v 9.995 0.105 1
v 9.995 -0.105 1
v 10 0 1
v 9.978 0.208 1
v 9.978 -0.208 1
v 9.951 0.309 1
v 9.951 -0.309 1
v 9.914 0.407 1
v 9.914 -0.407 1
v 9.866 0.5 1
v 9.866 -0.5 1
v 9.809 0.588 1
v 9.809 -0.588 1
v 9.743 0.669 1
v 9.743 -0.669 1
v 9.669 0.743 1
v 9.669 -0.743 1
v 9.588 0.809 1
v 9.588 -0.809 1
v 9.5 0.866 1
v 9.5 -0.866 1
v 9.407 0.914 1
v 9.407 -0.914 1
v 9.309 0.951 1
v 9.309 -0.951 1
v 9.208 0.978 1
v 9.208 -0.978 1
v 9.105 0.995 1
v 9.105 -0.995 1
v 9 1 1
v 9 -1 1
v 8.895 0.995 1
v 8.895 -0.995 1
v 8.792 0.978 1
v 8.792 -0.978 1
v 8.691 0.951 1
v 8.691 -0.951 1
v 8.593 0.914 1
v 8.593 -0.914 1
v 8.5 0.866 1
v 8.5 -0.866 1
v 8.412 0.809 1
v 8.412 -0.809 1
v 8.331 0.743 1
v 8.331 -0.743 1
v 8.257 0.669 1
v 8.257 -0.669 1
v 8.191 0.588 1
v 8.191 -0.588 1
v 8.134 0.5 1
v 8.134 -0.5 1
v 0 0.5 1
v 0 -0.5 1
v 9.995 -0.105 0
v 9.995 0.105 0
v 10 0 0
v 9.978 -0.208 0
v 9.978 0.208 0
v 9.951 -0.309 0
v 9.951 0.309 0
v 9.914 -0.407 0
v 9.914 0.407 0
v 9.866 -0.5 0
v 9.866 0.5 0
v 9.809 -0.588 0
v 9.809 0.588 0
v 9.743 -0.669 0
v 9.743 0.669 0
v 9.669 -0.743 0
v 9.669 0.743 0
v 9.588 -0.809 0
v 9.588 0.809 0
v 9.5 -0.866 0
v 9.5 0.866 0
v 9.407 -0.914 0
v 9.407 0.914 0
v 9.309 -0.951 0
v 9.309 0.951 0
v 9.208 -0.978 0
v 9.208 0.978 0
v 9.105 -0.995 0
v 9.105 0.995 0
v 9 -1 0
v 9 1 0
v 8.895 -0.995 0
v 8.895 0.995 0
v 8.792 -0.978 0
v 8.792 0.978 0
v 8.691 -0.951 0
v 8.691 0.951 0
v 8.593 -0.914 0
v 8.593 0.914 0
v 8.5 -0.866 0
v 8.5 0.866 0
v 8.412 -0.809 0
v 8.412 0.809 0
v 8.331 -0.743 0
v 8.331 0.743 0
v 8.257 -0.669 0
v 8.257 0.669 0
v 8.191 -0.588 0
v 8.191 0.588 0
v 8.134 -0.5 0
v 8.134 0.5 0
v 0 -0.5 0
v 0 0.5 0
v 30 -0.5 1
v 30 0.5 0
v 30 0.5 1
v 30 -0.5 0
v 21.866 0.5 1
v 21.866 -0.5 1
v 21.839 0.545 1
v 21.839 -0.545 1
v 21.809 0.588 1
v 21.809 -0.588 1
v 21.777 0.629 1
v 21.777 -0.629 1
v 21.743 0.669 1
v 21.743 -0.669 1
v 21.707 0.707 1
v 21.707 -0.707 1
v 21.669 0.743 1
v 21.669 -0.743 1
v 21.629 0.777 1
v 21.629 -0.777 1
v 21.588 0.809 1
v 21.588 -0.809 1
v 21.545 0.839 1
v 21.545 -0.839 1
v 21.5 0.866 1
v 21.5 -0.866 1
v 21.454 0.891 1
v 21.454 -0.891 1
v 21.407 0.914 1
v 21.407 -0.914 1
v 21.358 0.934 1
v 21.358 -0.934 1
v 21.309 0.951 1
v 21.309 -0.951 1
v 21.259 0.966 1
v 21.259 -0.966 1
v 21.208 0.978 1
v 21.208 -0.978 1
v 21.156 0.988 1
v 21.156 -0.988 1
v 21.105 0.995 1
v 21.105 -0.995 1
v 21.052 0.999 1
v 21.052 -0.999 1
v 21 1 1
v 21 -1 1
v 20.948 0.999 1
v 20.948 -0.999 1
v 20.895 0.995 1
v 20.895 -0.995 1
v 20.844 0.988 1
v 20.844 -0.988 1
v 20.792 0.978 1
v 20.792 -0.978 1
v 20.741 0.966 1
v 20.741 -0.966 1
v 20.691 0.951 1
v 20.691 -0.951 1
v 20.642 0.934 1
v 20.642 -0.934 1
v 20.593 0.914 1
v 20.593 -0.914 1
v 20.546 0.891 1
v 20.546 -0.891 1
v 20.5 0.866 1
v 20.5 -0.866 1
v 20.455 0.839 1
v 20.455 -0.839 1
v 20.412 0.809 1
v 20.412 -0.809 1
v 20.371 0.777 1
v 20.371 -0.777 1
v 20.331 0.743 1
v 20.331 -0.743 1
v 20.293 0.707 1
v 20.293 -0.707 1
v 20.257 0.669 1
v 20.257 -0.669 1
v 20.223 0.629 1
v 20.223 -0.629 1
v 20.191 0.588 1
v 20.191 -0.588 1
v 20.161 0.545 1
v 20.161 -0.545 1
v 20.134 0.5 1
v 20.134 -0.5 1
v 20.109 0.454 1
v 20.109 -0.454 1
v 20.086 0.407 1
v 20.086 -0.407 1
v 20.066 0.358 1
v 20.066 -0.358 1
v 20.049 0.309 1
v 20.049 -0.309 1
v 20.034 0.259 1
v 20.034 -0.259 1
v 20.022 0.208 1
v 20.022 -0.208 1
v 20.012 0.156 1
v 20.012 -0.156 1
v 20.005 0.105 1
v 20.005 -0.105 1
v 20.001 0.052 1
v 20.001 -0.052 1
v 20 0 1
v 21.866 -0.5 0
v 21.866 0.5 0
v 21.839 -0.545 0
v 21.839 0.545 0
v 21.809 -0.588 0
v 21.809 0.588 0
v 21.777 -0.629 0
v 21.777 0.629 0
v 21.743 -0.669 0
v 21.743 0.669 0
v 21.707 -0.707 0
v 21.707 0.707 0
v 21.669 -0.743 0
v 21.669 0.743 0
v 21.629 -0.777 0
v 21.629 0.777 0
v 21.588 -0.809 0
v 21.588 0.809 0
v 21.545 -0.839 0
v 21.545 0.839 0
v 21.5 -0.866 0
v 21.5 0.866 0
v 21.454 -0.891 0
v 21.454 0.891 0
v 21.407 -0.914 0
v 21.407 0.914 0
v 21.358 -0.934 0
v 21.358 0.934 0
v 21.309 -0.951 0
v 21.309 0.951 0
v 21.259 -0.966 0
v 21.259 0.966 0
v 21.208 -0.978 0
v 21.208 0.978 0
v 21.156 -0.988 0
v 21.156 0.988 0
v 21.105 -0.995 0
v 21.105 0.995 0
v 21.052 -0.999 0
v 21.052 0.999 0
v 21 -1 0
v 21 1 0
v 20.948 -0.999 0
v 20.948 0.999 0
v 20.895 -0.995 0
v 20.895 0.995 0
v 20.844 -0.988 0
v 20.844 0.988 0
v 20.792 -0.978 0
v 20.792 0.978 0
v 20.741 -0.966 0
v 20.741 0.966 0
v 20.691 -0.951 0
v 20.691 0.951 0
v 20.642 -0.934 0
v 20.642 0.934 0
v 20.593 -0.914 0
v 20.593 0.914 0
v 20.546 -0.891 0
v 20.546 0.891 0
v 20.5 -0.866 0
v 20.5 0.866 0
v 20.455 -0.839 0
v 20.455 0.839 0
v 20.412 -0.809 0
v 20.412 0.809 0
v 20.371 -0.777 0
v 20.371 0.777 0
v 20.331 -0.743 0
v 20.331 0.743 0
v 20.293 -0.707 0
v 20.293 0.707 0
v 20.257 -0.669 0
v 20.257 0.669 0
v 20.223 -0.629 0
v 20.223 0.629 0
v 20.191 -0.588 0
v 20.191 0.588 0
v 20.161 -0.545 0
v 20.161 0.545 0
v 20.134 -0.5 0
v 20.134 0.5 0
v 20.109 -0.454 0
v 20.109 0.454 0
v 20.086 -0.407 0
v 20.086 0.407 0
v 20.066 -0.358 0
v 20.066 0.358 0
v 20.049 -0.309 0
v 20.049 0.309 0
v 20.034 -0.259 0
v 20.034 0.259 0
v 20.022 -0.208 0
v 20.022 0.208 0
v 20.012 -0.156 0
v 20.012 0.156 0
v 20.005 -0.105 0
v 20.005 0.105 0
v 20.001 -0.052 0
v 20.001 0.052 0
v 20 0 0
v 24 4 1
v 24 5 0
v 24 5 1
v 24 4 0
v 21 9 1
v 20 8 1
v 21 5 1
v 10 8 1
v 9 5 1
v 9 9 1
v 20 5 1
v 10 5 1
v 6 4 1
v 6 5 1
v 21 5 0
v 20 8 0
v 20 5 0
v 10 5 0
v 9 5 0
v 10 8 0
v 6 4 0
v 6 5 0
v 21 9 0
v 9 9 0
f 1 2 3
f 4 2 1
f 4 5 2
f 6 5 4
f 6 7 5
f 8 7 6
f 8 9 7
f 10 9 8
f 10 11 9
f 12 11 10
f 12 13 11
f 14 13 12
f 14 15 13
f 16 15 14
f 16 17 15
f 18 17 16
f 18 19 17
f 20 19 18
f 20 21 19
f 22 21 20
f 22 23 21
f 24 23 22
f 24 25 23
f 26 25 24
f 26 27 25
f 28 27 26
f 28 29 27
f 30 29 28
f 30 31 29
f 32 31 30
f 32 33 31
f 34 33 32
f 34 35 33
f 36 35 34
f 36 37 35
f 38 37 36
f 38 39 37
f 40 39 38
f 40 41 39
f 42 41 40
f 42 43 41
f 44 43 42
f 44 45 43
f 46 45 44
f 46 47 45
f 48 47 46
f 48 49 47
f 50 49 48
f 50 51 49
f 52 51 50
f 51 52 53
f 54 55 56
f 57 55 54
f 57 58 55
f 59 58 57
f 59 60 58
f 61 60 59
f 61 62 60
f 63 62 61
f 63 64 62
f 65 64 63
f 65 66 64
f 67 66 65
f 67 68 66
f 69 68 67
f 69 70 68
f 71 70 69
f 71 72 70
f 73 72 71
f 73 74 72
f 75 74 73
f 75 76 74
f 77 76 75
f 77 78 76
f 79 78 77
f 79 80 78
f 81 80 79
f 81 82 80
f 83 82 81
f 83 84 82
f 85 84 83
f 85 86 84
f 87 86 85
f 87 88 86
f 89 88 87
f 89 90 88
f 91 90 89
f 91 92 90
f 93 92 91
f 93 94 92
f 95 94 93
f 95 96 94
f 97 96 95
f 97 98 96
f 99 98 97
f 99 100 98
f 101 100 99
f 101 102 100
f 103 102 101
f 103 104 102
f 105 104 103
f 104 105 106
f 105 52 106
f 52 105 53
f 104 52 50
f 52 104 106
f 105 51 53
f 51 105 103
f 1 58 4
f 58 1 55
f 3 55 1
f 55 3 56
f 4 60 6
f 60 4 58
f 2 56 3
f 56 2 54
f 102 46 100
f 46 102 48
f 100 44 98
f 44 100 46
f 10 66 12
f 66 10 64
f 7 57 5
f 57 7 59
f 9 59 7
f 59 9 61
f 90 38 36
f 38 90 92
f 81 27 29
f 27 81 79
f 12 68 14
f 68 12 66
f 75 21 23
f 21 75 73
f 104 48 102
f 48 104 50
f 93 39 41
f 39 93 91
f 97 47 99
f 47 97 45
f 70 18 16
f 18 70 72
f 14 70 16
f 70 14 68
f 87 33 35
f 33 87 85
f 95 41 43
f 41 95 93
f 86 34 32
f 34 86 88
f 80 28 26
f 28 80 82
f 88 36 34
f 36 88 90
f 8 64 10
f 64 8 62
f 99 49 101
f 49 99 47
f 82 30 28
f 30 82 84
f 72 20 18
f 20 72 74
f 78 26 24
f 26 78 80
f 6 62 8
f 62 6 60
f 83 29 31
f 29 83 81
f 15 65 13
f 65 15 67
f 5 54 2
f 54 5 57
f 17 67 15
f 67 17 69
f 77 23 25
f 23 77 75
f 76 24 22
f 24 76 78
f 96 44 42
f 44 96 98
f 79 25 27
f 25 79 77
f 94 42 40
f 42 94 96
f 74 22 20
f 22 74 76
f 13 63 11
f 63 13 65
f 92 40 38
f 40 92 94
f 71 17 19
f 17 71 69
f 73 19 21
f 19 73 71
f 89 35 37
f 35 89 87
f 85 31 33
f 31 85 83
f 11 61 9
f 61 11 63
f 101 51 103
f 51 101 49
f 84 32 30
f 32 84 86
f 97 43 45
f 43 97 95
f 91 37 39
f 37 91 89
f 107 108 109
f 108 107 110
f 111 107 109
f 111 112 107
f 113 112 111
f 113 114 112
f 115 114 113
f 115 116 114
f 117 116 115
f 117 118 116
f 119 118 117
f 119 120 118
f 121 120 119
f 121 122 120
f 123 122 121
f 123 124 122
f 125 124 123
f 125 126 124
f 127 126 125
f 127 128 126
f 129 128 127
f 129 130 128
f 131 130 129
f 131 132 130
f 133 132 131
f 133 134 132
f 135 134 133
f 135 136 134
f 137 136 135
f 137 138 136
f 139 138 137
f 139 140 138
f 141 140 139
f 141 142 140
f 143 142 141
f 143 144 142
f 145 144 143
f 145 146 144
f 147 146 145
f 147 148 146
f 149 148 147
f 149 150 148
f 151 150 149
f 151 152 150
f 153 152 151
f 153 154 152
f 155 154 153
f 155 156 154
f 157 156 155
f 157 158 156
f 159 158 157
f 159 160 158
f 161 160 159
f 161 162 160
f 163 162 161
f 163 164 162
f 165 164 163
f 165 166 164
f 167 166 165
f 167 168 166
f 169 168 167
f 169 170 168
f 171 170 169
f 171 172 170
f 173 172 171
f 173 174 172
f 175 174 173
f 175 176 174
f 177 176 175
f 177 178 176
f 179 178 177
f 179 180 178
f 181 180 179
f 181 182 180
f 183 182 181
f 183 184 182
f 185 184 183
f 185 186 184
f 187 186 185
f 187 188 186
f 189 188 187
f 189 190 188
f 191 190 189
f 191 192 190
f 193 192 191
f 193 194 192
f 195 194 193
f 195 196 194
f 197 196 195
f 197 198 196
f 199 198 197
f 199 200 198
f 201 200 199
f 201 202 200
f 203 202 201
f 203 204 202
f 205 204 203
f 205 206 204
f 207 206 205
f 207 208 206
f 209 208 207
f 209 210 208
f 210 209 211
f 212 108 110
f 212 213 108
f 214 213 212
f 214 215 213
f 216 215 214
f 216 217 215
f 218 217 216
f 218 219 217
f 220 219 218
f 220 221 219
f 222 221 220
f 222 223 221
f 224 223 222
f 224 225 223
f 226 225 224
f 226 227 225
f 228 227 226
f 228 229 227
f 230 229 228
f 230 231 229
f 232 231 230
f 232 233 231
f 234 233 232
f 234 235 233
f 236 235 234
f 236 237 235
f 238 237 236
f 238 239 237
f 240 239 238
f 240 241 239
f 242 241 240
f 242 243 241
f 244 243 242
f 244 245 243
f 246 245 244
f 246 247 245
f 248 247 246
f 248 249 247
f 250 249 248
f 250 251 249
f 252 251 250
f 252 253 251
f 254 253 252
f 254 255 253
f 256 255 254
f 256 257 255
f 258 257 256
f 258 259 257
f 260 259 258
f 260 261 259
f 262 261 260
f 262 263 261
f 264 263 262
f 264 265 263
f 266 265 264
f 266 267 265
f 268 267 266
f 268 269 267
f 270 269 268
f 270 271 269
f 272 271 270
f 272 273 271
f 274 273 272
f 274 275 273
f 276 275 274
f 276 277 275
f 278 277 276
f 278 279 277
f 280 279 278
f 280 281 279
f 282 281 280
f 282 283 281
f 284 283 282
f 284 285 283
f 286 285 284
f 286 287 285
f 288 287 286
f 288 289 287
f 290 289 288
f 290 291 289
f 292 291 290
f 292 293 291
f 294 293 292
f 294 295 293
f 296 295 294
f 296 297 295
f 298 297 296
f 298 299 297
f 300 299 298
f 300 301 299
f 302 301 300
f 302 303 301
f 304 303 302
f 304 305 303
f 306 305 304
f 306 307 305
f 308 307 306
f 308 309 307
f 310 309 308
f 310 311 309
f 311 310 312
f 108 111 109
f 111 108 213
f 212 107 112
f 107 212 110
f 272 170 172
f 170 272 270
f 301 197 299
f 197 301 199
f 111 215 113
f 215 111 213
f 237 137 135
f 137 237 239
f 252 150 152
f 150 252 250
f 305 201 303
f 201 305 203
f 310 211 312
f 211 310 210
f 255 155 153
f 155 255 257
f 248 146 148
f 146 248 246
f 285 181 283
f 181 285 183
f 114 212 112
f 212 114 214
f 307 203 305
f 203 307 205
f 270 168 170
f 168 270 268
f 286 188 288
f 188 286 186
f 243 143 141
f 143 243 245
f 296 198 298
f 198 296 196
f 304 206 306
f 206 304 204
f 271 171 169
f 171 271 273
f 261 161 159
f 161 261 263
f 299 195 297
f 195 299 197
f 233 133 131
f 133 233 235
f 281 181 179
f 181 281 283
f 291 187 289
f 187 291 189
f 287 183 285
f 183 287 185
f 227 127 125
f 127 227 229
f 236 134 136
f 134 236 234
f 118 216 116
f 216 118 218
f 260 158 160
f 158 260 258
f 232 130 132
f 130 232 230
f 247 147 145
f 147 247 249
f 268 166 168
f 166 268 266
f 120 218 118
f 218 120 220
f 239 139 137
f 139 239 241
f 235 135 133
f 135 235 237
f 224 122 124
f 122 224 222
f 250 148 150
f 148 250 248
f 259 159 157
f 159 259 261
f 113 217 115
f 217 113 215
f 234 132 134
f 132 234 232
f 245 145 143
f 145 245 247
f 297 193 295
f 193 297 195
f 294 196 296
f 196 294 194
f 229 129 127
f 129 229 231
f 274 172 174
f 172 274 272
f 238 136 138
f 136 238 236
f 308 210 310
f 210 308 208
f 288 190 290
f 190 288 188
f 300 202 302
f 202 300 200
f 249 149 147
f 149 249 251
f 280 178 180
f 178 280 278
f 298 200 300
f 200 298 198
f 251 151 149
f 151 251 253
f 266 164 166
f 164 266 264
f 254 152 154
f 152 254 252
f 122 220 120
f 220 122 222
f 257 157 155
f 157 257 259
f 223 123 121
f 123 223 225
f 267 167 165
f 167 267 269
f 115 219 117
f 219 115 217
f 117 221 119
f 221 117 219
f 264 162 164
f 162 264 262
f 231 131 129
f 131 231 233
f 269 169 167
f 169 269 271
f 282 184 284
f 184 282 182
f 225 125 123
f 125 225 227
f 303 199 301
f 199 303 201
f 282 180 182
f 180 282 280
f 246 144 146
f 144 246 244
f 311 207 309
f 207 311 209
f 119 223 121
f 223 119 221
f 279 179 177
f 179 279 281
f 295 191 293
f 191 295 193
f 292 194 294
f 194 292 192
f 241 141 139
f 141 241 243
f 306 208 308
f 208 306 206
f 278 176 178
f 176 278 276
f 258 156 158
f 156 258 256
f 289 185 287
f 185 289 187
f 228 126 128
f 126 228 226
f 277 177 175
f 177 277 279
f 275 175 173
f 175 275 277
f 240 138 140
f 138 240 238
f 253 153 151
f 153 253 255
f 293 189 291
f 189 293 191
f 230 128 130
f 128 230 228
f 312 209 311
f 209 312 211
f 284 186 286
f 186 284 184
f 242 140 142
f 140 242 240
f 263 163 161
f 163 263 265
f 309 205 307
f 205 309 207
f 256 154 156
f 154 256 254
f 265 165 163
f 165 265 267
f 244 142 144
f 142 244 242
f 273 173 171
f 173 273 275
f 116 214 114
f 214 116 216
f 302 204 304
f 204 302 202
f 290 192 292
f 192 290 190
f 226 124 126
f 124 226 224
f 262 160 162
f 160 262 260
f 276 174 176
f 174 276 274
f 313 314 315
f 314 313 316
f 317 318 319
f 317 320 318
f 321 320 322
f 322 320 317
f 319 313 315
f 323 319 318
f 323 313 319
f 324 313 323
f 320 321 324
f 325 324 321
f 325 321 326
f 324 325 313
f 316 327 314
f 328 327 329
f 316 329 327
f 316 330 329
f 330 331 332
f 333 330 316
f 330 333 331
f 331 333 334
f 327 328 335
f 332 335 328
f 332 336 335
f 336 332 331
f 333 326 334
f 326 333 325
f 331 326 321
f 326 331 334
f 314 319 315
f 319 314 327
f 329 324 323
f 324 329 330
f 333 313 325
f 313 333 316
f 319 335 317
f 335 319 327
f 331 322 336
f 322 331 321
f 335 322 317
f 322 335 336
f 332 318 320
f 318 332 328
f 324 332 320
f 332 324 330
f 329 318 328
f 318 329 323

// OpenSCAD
//use <sym_switch_no.scad>

module button(length, width, thickness, height)
{
    translate([0,-thickness/2,0])cube([length/2-width/2, thickness, height]);
    
    translate([length/2-width/2,0,0]) cylinder(h=height, r=thickness, $fn=60);

    translate([(length/2+width/2),-thickness/2,0])cube([(length/2-width/2), thickness, height]);
    
    translate([length/2+width/2,0,0]) cylinder(h=height, r=thickness, $fn=120);

    translate([length/2-3*width/4,width/3,0]) cube([1.5*width, thickness, height]);
    
    translate([length/2-width/2,2*width/3,0]) cube([width, thickness, height]);
    
    translate([length/2-width/2,width/3,0]) cube([thickness, width/3, height]);

    translate([length/2+width/2-thickness,width/3,0]) cube([thickness, width/3, height]);

    //translate([(length/2-width/2),+thickness/2, 0])rotate([0,0,-60])cube([thickness, width, height]);
    
    //translate([3*length/8+thickness,width/3,0]) cube([thickness, width/2, height]);
    //translate([4*length/8,width/2,0]) cube([thickness, width/3, height]);

    //translate([3.5*length/8,2.3*width/3,0]) rotate([0,0,55])cube([thickness, width/3, height]);
    //translate([3.8*length/8,2.25*width/3+thickness,0]) rotate([0,0,-55])cube([thickness, width/3, height]);

    //translate([2.65*length/8, width,0]) cube([width/1.5, thickness, height]);
    //translate([2.65*length/8, width+2*thickness,0]) cube([width/1.5, thickness, height]);
    
}

button(30, 12, 1, 1);
